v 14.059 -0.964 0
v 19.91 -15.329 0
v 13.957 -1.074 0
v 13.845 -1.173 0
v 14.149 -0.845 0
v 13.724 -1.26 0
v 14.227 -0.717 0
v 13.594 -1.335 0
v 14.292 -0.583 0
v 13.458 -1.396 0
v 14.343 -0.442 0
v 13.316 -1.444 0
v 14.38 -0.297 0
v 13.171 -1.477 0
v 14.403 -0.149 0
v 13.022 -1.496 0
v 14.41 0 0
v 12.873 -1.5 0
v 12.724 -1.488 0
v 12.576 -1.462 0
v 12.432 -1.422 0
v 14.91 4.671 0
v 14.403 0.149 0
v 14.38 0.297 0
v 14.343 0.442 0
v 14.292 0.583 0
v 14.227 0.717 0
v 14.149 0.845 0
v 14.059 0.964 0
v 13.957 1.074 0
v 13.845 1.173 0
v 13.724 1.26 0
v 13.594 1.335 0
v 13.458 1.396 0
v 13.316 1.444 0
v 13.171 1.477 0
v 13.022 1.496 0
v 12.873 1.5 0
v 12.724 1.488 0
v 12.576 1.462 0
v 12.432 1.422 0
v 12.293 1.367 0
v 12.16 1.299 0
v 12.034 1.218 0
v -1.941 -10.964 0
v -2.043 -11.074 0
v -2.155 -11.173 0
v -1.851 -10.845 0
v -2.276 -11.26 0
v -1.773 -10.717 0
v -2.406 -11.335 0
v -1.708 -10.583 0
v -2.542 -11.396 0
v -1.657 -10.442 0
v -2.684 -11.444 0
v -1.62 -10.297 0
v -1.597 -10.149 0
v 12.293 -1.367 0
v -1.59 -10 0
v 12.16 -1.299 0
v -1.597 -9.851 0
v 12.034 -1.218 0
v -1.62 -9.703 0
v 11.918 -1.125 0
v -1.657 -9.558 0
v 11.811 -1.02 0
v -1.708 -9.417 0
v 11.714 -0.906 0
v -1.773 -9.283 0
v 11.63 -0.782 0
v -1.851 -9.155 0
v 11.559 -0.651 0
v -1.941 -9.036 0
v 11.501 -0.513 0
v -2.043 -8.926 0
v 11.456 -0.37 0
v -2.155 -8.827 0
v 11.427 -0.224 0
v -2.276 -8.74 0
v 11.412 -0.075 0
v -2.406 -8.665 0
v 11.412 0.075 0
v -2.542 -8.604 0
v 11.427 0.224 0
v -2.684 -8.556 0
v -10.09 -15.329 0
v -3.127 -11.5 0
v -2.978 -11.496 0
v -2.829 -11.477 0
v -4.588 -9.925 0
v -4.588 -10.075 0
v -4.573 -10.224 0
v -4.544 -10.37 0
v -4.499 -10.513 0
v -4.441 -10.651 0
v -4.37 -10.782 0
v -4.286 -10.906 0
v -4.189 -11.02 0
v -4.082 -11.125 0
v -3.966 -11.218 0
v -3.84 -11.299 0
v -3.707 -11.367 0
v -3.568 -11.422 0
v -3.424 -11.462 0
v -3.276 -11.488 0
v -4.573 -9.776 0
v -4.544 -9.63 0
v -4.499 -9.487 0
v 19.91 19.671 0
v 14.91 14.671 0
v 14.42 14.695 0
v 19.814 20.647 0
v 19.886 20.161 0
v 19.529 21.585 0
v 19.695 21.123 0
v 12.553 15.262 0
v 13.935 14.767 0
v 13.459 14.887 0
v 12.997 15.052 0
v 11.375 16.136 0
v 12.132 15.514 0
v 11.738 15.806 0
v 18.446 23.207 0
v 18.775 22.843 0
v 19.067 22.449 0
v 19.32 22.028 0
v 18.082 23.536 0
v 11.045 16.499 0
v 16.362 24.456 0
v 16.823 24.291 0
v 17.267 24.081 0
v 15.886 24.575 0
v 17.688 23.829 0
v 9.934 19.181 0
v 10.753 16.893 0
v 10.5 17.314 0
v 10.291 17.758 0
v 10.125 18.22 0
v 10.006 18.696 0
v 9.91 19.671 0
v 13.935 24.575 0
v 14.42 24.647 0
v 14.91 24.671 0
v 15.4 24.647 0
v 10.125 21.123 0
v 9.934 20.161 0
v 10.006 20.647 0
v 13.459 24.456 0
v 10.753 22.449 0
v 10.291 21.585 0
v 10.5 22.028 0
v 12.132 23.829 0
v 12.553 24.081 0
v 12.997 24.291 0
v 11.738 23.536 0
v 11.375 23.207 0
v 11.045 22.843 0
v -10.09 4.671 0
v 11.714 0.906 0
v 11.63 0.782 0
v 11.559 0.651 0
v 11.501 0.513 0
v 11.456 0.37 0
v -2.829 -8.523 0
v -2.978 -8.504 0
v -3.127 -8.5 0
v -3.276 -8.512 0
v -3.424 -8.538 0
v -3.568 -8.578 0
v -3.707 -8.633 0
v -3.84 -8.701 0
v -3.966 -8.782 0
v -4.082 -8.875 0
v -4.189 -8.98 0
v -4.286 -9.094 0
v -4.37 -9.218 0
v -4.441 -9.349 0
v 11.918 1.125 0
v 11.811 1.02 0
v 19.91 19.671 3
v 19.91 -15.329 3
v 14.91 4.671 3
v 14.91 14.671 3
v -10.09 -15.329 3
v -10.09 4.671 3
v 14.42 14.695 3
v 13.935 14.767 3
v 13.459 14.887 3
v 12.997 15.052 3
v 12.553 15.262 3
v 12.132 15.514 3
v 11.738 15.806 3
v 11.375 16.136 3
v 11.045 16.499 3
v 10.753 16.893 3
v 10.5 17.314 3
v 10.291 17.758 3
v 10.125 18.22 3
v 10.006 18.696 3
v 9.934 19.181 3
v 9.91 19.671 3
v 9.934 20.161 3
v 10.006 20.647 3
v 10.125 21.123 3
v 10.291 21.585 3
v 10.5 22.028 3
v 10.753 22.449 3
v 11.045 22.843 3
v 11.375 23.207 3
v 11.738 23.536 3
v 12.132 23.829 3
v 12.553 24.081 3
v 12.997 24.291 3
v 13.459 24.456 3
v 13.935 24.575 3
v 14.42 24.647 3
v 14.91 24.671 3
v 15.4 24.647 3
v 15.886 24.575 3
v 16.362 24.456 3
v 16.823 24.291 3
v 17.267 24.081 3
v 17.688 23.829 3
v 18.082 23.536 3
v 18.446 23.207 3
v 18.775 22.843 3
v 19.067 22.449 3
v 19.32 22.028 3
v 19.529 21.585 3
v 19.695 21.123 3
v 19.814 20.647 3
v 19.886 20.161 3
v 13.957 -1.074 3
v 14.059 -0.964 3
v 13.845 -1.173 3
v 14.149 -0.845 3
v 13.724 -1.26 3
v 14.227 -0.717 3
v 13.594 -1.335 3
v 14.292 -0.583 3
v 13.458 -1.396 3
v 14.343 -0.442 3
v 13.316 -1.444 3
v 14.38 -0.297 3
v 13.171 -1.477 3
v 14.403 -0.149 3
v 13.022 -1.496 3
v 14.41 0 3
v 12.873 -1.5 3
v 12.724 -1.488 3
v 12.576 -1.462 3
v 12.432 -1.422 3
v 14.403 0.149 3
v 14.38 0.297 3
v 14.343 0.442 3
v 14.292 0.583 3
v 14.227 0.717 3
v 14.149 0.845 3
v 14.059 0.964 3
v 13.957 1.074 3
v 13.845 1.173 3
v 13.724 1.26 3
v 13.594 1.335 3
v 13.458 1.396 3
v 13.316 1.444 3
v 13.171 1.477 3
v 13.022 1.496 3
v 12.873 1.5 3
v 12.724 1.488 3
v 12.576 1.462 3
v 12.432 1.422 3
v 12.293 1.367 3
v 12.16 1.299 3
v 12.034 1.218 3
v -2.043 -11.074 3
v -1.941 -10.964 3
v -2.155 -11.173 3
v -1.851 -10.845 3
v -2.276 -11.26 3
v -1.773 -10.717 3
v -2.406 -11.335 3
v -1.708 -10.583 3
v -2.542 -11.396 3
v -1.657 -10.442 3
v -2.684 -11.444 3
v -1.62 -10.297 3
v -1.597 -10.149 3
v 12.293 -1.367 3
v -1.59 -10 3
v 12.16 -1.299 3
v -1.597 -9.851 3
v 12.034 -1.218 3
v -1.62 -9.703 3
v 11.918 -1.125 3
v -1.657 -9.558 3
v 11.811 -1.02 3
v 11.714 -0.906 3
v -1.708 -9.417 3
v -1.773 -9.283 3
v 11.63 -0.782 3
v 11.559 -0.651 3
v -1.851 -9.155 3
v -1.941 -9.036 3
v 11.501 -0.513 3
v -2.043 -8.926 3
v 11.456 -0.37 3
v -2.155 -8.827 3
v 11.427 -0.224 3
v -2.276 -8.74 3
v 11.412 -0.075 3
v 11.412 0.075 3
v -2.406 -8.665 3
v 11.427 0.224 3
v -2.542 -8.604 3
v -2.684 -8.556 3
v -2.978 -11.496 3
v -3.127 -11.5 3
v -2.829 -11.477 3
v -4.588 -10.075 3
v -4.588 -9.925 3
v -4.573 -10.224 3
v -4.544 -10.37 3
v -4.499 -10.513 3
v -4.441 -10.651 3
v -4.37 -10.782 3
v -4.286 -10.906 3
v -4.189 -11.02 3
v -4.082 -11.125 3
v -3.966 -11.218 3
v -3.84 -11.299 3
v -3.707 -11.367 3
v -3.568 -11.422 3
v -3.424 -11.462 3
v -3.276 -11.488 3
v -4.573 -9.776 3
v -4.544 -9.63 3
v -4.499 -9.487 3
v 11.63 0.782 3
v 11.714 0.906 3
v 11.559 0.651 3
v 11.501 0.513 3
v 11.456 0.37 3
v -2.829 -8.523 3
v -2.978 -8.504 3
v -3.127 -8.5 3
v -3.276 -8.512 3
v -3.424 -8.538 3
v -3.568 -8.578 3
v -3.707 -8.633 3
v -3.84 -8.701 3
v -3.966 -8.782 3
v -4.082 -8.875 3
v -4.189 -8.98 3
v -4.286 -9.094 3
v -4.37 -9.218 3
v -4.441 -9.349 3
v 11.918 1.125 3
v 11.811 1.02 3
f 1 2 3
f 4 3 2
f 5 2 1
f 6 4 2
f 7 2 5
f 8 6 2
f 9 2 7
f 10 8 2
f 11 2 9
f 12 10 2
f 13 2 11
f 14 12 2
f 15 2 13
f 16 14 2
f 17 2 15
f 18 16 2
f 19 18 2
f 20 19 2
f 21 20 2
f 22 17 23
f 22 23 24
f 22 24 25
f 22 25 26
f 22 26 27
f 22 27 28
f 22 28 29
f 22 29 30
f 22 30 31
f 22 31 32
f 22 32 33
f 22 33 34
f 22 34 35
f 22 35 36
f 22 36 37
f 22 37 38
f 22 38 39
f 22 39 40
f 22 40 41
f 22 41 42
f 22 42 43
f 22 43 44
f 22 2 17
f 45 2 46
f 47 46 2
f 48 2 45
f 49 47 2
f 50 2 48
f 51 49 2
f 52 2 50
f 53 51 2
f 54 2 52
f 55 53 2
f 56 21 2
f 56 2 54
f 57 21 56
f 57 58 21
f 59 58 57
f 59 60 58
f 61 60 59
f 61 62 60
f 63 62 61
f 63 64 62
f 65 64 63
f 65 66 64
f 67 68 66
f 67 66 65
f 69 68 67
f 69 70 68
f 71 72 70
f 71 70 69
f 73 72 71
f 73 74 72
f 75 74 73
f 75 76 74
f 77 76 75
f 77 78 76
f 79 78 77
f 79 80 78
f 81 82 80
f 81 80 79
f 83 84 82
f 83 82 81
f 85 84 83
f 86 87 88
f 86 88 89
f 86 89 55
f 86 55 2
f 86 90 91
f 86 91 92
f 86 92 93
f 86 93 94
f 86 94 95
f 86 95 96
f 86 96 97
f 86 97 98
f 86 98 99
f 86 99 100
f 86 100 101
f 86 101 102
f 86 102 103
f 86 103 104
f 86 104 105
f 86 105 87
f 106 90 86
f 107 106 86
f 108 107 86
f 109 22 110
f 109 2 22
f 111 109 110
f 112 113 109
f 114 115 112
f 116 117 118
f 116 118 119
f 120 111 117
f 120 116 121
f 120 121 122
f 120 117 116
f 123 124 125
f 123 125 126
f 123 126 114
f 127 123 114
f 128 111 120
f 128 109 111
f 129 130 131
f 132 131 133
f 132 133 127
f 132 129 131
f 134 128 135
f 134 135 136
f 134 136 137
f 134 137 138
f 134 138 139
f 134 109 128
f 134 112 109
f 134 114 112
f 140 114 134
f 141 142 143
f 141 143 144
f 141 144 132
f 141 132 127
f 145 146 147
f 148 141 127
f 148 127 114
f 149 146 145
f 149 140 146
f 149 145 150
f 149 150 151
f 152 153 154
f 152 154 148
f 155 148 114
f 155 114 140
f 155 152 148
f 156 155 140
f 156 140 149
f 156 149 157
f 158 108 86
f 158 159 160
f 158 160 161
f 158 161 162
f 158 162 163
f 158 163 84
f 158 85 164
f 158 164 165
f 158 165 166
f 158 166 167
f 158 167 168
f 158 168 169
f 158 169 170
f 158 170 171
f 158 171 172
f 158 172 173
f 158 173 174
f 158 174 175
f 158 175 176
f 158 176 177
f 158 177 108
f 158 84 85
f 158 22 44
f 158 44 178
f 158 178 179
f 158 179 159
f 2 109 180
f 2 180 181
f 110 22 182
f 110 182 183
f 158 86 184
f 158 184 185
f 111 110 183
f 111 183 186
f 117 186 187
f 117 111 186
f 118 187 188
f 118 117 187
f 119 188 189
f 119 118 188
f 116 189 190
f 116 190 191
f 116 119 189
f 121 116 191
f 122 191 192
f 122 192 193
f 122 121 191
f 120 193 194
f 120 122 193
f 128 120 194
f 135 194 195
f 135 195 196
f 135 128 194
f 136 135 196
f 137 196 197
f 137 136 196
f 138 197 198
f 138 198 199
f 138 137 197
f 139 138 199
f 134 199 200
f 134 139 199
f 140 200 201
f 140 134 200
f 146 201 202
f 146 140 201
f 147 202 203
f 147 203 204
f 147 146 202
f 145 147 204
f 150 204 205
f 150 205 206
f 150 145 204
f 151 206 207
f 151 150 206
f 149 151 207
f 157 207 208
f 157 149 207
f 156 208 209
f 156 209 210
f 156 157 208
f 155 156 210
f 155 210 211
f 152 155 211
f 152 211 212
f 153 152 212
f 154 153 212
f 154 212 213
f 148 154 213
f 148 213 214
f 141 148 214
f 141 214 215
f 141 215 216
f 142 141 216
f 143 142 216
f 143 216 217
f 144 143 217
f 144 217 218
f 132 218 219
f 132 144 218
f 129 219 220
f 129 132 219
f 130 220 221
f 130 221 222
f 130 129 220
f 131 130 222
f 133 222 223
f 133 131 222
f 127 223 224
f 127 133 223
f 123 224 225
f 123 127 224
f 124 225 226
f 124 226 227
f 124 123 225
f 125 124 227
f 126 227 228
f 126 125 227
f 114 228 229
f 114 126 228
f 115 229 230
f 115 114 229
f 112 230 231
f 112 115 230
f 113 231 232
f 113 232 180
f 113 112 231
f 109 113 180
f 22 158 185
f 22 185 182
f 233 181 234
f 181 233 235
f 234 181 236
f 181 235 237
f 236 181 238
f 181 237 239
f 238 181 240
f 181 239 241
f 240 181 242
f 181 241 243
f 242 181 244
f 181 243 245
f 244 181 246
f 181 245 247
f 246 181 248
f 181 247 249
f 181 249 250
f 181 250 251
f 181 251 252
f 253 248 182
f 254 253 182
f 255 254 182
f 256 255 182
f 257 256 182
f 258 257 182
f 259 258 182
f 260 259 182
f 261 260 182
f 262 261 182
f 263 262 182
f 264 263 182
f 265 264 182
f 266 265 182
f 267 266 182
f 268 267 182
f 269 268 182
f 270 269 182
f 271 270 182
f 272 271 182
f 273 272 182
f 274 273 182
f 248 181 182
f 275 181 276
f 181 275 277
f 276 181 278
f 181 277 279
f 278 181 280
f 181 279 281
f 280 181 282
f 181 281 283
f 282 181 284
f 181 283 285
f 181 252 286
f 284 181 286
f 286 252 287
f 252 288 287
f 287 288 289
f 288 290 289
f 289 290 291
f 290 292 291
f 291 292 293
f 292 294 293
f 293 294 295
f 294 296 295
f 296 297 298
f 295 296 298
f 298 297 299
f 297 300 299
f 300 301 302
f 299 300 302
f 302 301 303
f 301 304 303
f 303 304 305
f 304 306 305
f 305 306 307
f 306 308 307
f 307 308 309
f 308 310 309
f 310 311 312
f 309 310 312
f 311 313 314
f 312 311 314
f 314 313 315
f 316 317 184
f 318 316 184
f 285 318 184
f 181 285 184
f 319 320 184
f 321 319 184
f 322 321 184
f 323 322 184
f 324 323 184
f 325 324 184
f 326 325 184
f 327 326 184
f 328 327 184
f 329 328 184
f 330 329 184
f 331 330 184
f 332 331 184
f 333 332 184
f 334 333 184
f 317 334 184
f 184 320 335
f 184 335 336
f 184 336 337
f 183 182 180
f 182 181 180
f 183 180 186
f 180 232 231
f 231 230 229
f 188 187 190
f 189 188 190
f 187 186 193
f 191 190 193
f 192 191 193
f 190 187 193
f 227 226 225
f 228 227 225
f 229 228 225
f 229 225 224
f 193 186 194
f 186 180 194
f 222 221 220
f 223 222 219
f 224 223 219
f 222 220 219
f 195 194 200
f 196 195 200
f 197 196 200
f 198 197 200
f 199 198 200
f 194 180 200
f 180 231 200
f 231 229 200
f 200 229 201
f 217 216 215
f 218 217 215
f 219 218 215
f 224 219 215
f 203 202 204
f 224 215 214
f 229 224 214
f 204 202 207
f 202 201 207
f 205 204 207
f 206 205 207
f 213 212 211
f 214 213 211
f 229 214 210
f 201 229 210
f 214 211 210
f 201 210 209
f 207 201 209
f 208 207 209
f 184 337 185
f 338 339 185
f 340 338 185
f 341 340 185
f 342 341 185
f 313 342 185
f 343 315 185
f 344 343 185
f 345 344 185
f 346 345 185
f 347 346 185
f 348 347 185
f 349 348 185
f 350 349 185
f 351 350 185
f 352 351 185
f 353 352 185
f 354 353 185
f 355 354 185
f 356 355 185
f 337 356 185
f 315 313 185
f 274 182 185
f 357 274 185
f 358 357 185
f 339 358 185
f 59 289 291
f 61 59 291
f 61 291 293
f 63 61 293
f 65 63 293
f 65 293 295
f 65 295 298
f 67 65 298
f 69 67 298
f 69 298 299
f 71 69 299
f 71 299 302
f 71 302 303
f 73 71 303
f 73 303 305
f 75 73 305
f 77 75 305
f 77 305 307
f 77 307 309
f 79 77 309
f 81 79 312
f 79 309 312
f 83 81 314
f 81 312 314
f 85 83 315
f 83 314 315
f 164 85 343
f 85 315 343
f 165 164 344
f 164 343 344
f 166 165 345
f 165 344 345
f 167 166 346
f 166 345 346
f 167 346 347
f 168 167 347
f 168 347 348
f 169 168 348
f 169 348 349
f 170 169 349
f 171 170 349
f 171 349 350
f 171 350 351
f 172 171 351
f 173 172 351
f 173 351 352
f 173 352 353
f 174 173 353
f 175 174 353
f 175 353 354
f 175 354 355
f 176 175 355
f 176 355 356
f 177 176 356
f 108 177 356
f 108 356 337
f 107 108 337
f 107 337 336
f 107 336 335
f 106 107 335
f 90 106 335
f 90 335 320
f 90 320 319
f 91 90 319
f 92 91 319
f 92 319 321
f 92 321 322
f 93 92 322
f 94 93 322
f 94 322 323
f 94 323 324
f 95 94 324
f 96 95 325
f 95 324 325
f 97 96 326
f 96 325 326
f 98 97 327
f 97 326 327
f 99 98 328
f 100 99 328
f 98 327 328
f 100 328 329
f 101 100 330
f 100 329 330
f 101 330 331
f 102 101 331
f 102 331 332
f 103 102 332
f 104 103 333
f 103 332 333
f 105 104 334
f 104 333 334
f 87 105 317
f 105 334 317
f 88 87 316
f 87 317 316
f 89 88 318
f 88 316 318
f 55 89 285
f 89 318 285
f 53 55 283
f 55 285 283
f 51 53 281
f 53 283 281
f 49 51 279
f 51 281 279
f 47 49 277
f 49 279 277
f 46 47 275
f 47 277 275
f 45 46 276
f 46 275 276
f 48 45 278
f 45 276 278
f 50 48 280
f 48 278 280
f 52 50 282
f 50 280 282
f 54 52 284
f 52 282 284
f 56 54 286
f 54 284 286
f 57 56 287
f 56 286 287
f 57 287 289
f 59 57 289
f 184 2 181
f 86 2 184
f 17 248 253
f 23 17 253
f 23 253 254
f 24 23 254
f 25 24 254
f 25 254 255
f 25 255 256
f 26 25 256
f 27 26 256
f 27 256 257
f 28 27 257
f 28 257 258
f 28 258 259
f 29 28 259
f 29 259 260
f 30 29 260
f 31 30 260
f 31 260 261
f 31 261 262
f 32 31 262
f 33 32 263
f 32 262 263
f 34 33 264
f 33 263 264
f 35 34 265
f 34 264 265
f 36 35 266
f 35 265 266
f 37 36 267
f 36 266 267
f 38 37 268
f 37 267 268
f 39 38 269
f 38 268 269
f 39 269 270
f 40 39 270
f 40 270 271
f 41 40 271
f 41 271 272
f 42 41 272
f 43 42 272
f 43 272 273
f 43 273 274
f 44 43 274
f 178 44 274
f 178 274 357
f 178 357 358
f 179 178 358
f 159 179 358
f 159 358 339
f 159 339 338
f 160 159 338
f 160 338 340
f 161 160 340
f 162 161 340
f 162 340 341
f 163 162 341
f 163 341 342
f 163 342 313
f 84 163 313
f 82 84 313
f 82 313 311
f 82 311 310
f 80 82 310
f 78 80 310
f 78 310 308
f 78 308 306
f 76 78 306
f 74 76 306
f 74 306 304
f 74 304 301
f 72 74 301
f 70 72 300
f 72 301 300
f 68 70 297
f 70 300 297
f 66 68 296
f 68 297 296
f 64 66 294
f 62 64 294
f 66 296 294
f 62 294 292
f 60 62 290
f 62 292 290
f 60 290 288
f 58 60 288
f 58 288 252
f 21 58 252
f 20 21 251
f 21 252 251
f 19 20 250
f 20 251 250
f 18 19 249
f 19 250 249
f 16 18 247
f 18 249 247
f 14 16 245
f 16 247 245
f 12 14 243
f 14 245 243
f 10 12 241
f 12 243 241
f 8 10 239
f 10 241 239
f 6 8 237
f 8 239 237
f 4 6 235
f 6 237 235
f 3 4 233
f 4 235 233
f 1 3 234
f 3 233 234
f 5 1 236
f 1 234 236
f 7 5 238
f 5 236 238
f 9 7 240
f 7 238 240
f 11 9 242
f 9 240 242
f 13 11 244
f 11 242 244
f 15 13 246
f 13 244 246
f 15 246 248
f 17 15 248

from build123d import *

# Parameters (mm, degrees)
EXTRUDE_1_DEPTH     = 3
SKETCH_2_R          = 1.5
CUT_EXTRUDE_2_DEPTH = 6


with BuildPart() as part:
    # 草图1 → 凸台-拉伸1 (new body)
    with BuildSketch(Plane.XY):
        with BuildLine():
            Line((14.91008261, 4.671258051), (14.91008261, 14.671258051))
            ThreePointArc((14.91008261, 14.671258051), (11.374548704, 23.206791957), (19.91008261, 19.671258051))
            Line((19.91008261, 19.671258051), (19.91008261, 7.339136796))
            Line((19.91008261, 7.339136796), (19.91008261, -15.328741949))
            Line((19.91008261, -15.328741949), (-10.08991739, -15.328741949))
            Line((-10.08991739, -15.328741949), (-10.08991739, 4.671258051))
            Line((-10.08991739, 4.671258051), (14.91008261, 4.671258051))
        make_face()
    extrude(amount=EXTRUDE_1_DEPTH)

    # 草图2 → 切除-拉伸2 (cut)
    with BuildSketch(Plane.XY.offset(3)):
        with Locations((12.91008261, 0)):
            Circle(SKETCH_2_R)
        with Locations((-3.08991739, -10)):
            Circle(SKETCH_2_R)
    extrude(amount=-CUT_EXTRUDE_2_DEPTH, mode=Mode.SUBTRACT)


solid = part.part
